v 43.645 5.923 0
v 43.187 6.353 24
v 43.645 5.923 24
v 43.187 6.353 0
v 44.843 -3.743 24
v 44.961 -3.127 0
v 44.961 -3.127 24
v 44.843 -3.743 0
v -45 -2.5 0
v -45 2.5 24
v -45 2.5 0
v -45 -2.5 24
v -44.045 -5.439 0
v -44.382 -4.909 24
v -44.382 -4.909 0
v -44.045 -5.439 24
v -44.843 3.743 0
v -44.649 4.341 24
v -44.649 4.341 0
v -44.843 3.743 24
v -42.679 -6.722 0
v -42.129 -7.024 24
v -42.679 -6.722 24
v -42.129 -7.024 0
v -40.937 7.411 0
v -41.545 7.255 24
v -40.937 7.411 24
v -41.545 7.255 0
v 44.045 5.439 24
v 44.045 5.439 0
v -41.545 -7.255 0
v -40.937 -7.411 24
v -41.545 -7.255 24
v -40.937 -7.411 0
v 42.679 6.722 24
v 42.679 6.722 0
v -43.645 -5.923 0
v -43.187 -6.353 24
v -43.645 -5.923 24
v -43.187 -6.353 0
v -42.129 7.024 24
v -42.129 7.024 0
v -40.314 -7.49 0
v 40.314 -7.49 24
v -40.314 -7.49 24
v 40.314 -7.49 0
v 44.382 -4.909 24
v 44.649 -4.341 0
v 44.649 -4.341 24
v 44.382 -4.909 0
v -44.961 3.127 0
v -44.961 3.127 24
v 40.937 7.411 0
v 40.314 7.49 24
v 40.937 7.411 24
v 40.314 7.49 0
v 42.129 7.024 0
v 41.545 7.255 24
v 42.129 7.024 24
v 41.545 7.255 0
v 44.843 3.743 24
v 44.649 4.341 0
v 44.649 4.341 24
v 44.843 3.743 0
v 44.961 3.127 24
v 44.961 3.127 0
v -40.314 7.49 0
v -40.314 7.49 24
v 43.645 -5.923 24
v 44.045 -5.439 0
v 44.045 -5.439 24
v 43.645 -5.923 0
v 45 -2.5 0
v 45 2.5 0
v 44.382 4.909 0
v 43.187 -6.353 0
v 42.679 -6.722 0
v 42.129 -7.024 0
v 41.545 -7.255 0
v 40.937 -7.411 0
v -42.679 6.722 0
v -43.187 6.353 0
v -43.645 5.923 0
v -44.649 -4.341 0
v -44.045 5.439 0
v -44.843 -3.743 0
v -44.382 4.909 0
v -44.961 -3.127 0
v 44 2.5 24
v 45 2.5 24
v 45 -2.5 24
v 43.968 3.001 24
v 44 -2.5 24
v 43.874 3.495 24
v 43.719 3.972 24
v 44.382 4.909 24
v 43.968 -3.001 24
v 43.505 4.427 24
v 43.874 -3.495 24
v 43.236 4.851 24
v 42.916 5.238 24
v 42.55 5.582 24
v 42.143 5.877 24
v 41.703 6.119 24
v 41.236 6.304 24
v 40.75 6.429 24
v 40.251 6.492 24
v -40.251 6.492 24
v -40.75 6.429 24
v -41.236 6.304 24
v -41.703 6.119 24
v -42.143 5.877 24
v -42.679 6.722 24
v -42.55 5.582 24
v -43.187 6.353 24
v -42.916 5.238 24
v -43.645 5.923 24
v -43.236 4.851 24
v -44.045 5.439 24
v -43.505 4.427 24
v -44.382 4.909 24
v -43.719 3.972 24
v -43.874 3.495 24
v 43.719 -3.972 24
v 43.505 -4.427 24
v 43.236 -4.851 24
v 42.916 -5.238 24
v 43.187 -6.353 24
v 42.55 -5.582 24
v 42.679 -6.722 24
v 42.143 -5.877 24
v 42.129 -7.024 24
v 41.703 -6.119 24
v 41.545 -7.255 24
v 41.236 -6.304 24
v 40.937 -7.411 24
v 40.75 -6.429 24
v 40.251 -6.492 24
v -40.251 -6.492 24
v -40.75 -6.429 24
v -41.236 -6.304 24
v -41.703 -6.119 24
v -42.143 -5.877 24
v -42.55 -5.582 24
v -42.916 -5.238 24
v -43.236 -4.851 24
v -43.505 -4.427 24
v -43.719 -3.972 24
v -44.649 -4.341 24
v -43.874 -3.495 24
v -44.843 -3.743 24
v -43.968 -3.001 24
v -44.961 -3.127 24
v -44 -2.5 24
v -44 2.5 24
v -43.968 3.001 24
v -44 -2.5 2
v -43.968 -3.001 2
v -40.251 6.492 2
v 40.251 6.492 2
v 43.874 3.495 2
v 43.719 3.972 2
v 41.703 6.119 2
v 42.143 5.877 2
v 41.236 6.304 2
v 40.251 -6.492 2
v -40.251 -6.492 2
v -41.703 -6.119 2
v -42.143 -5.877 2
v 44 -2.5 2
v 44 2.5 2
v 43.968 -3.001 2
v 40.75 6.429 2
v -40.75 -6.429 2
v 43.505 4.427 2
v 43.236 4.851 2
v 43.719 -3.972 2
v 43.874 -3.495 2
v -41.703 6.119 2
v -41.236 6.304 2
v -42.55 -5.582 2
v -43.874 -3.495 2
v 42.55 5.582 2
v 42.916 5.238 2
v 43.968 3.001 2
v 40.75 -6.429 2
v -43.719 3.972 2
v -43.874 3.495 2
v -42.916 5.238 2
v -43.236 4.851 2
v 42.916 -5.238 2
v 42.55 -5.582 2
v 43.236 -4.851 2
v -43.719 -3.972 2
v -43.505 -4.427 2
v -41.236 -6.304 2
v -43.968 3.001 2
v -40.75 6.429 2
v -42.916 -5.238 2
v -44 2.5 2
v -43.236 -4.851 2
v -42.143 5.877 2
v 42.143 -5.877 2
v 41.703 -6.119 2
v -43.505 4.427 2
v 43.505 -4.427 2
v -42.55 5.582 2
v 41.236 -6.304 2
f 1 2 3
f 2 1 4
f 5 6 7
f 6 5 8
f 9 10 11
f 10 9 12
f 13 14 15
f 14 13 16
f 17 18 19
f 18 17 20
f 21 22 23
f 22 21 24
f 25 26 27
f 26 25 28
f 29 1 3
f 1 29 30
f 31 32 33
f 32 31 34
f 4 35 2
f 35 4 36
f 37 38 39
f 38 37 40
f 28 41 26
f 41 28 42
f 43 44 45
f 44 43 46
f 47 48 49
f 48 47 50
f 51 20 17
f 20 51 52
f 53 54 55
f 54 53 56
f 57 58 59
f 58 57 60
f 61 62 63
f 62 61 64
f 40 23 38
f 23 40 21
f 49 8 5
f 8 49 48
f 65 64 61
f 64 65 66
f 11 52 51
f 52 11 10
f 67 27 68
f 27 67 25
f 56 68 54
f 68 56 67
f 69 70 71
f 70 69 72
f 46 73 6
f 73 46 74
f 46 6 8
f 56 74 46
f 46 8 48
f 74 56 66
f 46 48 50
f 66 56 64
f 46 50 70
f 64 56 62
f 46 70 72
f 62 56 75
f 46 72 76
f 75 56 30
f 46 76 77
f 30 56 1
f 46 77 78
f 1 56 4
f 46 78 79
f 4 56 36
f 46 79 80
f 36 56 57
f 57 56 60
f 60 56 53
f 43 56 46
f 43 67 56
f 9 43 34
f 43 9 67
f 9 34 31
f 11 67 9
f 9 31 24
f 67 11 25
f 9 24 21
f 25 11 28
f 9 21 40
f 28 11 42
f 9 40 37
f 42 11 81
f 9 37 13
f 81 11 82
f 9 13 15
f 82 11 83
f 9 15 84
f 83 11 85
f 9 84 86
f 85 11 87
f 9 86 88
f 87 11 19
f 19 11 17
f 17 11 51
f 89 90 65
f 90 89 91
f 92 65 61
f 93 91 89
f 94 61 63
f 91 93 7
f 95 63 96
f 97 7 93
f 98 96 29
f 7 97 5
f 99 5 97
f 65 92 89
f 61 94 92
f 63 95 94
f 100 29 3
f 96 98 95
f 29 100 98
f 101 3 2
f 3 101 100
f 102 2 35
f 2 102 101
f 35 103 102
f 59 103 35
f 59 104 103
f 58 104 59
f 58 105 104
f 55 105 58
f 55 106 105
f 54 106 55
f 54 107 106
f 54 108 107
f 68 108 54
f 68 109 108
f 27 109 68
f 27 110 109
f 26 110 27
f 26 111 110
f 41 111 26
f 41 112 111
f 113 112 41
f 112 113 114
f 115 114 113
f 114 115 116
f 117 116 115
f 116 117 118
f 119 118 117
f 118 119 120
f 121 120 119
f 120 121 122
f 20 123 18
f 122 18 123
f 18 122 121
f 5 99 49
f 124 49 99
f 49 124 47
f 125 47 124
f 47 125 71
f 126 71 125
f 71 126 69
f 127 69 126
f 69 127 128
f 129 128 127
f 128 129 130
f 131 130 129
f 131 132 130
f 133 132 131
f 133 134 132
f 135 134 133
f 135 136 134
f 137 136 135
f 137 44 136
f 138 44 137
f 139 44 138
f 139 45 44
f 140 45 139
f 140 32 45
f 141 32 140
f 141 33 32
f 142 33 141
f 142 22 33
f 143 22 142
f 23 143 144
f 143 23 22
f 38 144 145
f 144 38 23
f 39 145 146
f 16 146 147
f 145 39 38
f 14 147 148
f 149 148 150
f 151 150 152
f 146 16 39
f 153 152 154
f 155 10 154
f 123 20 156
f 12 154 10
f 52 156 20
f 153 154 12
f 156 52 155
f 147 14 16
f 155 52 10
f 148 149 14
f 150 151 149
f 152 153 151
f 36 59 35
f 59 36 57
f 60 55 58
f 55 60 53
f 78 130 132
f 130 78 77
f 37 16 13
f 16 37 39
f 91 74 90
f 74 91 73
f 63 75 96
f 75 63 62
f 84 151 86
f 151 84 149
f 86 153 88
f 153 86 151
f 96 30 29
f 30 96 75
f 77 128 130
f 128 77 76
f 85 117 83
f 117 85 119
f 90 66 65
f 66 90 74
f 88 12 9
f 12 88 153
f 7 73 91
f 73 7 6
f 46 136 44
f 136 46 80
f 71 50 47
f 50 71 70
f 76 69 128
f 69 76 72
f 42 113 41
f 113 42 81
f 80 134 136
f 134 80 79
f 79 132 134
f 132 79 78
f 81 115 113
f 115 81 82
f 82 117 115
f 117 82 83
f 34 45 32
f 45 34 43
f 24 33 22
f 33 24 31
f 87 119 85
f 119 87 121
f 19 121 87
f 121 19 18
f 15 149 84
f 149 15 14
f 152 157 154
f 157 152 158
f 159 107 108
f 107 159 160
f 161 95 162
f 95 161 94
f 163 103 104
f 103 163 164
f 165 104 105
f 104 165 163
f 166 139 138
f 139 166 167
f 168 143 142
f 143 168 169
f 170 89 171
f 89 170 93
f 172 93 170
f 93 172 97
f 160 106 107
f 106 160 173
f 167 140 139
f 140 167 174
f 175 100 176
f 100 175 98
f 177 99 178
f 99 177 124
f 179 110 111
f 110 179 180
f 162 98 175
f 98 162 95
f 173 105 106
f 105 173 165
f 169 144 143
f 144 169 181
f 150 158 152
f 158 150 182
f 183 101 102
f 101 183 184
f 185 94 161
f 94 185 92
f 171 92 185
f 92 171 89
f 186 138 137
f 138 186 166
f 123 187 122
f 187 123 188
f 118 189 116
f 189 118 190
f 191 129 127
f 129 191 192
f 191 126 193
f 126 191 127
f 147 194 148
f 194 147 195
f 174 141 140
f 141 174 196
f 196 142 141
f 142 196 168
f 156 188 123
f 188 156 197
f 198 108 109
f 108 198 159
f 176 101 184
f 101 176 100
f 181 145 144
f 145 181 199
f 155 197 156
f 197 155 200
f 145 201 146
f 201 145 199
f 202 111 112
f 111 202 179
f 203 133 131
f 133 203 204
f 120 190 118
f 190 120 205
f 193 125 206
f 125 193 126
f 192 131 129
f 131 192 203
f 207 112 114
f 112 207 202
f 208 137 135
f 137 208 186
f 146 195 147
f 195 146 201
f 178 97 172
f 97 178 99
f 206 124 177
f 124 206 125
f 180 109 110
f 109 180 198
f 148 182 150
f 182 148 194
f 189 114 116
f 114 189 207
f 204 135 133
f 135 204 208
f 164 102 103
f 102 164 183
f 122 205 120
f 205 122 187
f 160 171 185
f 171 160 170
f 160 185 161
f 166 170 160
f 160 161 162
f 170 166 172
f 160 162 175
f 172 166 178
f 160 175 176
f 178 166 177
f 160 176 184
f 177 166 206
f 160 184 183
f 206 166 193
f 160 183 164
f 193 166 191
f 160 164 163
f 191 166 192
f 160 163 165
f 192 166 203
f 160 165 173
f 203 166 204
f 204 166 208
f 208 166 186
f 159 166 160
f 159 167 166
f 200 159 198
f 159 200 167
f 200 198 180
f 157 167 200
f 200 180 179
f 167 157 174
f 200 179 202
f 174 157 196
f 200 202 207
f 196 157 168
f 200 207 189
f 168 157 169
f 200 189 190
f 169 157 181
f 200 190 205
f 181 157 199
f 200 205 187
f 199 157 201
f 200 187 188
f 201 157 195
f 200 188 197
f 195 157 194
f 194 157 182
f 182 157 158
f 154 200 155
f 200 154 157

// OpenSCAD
$fn = 50;


difference() {
	union() {
		hull() {
			translate(v = [-40.0000000000, 2.5000000000, 0]) {
				cylinder(h = 24, r = 5);
			}
			translate(v = [40.0000000000, 2.5000000000, 0]) {
				cylinder(h = 24, r = 5);
			}
			translate(v = [-40.0000000000, -2.5000000000, 0]) {
				cylinder(h = 24, r = 5);
			}
			translate(v = [40.0000000000, -2.5000000000, 0]) {
				cylinder(h = 24, r = 5);
			}
		}
	}
	union() {
		translate(v = [0, 0, 2]) {
			#hull() {
				translate(v = [-40.0000000000, 2.5000000000, 0]) {
					cylinder(h = 22, r = 4);
				}
				translate(v = [40.0000000000, 2.5000000000, 0]) {
					cylinder(h = 22, r = 4);
				}
				translate(v = [-40.0000000000, -2.5000000000, 0]) {
					cylinder(h = 22, r = 4);
				}
				translate(v = [40.0000000000, -2.5000000000, 0]) {
					cylinder(h = 22, r = 4);
				}
			}
		}
	}
}
